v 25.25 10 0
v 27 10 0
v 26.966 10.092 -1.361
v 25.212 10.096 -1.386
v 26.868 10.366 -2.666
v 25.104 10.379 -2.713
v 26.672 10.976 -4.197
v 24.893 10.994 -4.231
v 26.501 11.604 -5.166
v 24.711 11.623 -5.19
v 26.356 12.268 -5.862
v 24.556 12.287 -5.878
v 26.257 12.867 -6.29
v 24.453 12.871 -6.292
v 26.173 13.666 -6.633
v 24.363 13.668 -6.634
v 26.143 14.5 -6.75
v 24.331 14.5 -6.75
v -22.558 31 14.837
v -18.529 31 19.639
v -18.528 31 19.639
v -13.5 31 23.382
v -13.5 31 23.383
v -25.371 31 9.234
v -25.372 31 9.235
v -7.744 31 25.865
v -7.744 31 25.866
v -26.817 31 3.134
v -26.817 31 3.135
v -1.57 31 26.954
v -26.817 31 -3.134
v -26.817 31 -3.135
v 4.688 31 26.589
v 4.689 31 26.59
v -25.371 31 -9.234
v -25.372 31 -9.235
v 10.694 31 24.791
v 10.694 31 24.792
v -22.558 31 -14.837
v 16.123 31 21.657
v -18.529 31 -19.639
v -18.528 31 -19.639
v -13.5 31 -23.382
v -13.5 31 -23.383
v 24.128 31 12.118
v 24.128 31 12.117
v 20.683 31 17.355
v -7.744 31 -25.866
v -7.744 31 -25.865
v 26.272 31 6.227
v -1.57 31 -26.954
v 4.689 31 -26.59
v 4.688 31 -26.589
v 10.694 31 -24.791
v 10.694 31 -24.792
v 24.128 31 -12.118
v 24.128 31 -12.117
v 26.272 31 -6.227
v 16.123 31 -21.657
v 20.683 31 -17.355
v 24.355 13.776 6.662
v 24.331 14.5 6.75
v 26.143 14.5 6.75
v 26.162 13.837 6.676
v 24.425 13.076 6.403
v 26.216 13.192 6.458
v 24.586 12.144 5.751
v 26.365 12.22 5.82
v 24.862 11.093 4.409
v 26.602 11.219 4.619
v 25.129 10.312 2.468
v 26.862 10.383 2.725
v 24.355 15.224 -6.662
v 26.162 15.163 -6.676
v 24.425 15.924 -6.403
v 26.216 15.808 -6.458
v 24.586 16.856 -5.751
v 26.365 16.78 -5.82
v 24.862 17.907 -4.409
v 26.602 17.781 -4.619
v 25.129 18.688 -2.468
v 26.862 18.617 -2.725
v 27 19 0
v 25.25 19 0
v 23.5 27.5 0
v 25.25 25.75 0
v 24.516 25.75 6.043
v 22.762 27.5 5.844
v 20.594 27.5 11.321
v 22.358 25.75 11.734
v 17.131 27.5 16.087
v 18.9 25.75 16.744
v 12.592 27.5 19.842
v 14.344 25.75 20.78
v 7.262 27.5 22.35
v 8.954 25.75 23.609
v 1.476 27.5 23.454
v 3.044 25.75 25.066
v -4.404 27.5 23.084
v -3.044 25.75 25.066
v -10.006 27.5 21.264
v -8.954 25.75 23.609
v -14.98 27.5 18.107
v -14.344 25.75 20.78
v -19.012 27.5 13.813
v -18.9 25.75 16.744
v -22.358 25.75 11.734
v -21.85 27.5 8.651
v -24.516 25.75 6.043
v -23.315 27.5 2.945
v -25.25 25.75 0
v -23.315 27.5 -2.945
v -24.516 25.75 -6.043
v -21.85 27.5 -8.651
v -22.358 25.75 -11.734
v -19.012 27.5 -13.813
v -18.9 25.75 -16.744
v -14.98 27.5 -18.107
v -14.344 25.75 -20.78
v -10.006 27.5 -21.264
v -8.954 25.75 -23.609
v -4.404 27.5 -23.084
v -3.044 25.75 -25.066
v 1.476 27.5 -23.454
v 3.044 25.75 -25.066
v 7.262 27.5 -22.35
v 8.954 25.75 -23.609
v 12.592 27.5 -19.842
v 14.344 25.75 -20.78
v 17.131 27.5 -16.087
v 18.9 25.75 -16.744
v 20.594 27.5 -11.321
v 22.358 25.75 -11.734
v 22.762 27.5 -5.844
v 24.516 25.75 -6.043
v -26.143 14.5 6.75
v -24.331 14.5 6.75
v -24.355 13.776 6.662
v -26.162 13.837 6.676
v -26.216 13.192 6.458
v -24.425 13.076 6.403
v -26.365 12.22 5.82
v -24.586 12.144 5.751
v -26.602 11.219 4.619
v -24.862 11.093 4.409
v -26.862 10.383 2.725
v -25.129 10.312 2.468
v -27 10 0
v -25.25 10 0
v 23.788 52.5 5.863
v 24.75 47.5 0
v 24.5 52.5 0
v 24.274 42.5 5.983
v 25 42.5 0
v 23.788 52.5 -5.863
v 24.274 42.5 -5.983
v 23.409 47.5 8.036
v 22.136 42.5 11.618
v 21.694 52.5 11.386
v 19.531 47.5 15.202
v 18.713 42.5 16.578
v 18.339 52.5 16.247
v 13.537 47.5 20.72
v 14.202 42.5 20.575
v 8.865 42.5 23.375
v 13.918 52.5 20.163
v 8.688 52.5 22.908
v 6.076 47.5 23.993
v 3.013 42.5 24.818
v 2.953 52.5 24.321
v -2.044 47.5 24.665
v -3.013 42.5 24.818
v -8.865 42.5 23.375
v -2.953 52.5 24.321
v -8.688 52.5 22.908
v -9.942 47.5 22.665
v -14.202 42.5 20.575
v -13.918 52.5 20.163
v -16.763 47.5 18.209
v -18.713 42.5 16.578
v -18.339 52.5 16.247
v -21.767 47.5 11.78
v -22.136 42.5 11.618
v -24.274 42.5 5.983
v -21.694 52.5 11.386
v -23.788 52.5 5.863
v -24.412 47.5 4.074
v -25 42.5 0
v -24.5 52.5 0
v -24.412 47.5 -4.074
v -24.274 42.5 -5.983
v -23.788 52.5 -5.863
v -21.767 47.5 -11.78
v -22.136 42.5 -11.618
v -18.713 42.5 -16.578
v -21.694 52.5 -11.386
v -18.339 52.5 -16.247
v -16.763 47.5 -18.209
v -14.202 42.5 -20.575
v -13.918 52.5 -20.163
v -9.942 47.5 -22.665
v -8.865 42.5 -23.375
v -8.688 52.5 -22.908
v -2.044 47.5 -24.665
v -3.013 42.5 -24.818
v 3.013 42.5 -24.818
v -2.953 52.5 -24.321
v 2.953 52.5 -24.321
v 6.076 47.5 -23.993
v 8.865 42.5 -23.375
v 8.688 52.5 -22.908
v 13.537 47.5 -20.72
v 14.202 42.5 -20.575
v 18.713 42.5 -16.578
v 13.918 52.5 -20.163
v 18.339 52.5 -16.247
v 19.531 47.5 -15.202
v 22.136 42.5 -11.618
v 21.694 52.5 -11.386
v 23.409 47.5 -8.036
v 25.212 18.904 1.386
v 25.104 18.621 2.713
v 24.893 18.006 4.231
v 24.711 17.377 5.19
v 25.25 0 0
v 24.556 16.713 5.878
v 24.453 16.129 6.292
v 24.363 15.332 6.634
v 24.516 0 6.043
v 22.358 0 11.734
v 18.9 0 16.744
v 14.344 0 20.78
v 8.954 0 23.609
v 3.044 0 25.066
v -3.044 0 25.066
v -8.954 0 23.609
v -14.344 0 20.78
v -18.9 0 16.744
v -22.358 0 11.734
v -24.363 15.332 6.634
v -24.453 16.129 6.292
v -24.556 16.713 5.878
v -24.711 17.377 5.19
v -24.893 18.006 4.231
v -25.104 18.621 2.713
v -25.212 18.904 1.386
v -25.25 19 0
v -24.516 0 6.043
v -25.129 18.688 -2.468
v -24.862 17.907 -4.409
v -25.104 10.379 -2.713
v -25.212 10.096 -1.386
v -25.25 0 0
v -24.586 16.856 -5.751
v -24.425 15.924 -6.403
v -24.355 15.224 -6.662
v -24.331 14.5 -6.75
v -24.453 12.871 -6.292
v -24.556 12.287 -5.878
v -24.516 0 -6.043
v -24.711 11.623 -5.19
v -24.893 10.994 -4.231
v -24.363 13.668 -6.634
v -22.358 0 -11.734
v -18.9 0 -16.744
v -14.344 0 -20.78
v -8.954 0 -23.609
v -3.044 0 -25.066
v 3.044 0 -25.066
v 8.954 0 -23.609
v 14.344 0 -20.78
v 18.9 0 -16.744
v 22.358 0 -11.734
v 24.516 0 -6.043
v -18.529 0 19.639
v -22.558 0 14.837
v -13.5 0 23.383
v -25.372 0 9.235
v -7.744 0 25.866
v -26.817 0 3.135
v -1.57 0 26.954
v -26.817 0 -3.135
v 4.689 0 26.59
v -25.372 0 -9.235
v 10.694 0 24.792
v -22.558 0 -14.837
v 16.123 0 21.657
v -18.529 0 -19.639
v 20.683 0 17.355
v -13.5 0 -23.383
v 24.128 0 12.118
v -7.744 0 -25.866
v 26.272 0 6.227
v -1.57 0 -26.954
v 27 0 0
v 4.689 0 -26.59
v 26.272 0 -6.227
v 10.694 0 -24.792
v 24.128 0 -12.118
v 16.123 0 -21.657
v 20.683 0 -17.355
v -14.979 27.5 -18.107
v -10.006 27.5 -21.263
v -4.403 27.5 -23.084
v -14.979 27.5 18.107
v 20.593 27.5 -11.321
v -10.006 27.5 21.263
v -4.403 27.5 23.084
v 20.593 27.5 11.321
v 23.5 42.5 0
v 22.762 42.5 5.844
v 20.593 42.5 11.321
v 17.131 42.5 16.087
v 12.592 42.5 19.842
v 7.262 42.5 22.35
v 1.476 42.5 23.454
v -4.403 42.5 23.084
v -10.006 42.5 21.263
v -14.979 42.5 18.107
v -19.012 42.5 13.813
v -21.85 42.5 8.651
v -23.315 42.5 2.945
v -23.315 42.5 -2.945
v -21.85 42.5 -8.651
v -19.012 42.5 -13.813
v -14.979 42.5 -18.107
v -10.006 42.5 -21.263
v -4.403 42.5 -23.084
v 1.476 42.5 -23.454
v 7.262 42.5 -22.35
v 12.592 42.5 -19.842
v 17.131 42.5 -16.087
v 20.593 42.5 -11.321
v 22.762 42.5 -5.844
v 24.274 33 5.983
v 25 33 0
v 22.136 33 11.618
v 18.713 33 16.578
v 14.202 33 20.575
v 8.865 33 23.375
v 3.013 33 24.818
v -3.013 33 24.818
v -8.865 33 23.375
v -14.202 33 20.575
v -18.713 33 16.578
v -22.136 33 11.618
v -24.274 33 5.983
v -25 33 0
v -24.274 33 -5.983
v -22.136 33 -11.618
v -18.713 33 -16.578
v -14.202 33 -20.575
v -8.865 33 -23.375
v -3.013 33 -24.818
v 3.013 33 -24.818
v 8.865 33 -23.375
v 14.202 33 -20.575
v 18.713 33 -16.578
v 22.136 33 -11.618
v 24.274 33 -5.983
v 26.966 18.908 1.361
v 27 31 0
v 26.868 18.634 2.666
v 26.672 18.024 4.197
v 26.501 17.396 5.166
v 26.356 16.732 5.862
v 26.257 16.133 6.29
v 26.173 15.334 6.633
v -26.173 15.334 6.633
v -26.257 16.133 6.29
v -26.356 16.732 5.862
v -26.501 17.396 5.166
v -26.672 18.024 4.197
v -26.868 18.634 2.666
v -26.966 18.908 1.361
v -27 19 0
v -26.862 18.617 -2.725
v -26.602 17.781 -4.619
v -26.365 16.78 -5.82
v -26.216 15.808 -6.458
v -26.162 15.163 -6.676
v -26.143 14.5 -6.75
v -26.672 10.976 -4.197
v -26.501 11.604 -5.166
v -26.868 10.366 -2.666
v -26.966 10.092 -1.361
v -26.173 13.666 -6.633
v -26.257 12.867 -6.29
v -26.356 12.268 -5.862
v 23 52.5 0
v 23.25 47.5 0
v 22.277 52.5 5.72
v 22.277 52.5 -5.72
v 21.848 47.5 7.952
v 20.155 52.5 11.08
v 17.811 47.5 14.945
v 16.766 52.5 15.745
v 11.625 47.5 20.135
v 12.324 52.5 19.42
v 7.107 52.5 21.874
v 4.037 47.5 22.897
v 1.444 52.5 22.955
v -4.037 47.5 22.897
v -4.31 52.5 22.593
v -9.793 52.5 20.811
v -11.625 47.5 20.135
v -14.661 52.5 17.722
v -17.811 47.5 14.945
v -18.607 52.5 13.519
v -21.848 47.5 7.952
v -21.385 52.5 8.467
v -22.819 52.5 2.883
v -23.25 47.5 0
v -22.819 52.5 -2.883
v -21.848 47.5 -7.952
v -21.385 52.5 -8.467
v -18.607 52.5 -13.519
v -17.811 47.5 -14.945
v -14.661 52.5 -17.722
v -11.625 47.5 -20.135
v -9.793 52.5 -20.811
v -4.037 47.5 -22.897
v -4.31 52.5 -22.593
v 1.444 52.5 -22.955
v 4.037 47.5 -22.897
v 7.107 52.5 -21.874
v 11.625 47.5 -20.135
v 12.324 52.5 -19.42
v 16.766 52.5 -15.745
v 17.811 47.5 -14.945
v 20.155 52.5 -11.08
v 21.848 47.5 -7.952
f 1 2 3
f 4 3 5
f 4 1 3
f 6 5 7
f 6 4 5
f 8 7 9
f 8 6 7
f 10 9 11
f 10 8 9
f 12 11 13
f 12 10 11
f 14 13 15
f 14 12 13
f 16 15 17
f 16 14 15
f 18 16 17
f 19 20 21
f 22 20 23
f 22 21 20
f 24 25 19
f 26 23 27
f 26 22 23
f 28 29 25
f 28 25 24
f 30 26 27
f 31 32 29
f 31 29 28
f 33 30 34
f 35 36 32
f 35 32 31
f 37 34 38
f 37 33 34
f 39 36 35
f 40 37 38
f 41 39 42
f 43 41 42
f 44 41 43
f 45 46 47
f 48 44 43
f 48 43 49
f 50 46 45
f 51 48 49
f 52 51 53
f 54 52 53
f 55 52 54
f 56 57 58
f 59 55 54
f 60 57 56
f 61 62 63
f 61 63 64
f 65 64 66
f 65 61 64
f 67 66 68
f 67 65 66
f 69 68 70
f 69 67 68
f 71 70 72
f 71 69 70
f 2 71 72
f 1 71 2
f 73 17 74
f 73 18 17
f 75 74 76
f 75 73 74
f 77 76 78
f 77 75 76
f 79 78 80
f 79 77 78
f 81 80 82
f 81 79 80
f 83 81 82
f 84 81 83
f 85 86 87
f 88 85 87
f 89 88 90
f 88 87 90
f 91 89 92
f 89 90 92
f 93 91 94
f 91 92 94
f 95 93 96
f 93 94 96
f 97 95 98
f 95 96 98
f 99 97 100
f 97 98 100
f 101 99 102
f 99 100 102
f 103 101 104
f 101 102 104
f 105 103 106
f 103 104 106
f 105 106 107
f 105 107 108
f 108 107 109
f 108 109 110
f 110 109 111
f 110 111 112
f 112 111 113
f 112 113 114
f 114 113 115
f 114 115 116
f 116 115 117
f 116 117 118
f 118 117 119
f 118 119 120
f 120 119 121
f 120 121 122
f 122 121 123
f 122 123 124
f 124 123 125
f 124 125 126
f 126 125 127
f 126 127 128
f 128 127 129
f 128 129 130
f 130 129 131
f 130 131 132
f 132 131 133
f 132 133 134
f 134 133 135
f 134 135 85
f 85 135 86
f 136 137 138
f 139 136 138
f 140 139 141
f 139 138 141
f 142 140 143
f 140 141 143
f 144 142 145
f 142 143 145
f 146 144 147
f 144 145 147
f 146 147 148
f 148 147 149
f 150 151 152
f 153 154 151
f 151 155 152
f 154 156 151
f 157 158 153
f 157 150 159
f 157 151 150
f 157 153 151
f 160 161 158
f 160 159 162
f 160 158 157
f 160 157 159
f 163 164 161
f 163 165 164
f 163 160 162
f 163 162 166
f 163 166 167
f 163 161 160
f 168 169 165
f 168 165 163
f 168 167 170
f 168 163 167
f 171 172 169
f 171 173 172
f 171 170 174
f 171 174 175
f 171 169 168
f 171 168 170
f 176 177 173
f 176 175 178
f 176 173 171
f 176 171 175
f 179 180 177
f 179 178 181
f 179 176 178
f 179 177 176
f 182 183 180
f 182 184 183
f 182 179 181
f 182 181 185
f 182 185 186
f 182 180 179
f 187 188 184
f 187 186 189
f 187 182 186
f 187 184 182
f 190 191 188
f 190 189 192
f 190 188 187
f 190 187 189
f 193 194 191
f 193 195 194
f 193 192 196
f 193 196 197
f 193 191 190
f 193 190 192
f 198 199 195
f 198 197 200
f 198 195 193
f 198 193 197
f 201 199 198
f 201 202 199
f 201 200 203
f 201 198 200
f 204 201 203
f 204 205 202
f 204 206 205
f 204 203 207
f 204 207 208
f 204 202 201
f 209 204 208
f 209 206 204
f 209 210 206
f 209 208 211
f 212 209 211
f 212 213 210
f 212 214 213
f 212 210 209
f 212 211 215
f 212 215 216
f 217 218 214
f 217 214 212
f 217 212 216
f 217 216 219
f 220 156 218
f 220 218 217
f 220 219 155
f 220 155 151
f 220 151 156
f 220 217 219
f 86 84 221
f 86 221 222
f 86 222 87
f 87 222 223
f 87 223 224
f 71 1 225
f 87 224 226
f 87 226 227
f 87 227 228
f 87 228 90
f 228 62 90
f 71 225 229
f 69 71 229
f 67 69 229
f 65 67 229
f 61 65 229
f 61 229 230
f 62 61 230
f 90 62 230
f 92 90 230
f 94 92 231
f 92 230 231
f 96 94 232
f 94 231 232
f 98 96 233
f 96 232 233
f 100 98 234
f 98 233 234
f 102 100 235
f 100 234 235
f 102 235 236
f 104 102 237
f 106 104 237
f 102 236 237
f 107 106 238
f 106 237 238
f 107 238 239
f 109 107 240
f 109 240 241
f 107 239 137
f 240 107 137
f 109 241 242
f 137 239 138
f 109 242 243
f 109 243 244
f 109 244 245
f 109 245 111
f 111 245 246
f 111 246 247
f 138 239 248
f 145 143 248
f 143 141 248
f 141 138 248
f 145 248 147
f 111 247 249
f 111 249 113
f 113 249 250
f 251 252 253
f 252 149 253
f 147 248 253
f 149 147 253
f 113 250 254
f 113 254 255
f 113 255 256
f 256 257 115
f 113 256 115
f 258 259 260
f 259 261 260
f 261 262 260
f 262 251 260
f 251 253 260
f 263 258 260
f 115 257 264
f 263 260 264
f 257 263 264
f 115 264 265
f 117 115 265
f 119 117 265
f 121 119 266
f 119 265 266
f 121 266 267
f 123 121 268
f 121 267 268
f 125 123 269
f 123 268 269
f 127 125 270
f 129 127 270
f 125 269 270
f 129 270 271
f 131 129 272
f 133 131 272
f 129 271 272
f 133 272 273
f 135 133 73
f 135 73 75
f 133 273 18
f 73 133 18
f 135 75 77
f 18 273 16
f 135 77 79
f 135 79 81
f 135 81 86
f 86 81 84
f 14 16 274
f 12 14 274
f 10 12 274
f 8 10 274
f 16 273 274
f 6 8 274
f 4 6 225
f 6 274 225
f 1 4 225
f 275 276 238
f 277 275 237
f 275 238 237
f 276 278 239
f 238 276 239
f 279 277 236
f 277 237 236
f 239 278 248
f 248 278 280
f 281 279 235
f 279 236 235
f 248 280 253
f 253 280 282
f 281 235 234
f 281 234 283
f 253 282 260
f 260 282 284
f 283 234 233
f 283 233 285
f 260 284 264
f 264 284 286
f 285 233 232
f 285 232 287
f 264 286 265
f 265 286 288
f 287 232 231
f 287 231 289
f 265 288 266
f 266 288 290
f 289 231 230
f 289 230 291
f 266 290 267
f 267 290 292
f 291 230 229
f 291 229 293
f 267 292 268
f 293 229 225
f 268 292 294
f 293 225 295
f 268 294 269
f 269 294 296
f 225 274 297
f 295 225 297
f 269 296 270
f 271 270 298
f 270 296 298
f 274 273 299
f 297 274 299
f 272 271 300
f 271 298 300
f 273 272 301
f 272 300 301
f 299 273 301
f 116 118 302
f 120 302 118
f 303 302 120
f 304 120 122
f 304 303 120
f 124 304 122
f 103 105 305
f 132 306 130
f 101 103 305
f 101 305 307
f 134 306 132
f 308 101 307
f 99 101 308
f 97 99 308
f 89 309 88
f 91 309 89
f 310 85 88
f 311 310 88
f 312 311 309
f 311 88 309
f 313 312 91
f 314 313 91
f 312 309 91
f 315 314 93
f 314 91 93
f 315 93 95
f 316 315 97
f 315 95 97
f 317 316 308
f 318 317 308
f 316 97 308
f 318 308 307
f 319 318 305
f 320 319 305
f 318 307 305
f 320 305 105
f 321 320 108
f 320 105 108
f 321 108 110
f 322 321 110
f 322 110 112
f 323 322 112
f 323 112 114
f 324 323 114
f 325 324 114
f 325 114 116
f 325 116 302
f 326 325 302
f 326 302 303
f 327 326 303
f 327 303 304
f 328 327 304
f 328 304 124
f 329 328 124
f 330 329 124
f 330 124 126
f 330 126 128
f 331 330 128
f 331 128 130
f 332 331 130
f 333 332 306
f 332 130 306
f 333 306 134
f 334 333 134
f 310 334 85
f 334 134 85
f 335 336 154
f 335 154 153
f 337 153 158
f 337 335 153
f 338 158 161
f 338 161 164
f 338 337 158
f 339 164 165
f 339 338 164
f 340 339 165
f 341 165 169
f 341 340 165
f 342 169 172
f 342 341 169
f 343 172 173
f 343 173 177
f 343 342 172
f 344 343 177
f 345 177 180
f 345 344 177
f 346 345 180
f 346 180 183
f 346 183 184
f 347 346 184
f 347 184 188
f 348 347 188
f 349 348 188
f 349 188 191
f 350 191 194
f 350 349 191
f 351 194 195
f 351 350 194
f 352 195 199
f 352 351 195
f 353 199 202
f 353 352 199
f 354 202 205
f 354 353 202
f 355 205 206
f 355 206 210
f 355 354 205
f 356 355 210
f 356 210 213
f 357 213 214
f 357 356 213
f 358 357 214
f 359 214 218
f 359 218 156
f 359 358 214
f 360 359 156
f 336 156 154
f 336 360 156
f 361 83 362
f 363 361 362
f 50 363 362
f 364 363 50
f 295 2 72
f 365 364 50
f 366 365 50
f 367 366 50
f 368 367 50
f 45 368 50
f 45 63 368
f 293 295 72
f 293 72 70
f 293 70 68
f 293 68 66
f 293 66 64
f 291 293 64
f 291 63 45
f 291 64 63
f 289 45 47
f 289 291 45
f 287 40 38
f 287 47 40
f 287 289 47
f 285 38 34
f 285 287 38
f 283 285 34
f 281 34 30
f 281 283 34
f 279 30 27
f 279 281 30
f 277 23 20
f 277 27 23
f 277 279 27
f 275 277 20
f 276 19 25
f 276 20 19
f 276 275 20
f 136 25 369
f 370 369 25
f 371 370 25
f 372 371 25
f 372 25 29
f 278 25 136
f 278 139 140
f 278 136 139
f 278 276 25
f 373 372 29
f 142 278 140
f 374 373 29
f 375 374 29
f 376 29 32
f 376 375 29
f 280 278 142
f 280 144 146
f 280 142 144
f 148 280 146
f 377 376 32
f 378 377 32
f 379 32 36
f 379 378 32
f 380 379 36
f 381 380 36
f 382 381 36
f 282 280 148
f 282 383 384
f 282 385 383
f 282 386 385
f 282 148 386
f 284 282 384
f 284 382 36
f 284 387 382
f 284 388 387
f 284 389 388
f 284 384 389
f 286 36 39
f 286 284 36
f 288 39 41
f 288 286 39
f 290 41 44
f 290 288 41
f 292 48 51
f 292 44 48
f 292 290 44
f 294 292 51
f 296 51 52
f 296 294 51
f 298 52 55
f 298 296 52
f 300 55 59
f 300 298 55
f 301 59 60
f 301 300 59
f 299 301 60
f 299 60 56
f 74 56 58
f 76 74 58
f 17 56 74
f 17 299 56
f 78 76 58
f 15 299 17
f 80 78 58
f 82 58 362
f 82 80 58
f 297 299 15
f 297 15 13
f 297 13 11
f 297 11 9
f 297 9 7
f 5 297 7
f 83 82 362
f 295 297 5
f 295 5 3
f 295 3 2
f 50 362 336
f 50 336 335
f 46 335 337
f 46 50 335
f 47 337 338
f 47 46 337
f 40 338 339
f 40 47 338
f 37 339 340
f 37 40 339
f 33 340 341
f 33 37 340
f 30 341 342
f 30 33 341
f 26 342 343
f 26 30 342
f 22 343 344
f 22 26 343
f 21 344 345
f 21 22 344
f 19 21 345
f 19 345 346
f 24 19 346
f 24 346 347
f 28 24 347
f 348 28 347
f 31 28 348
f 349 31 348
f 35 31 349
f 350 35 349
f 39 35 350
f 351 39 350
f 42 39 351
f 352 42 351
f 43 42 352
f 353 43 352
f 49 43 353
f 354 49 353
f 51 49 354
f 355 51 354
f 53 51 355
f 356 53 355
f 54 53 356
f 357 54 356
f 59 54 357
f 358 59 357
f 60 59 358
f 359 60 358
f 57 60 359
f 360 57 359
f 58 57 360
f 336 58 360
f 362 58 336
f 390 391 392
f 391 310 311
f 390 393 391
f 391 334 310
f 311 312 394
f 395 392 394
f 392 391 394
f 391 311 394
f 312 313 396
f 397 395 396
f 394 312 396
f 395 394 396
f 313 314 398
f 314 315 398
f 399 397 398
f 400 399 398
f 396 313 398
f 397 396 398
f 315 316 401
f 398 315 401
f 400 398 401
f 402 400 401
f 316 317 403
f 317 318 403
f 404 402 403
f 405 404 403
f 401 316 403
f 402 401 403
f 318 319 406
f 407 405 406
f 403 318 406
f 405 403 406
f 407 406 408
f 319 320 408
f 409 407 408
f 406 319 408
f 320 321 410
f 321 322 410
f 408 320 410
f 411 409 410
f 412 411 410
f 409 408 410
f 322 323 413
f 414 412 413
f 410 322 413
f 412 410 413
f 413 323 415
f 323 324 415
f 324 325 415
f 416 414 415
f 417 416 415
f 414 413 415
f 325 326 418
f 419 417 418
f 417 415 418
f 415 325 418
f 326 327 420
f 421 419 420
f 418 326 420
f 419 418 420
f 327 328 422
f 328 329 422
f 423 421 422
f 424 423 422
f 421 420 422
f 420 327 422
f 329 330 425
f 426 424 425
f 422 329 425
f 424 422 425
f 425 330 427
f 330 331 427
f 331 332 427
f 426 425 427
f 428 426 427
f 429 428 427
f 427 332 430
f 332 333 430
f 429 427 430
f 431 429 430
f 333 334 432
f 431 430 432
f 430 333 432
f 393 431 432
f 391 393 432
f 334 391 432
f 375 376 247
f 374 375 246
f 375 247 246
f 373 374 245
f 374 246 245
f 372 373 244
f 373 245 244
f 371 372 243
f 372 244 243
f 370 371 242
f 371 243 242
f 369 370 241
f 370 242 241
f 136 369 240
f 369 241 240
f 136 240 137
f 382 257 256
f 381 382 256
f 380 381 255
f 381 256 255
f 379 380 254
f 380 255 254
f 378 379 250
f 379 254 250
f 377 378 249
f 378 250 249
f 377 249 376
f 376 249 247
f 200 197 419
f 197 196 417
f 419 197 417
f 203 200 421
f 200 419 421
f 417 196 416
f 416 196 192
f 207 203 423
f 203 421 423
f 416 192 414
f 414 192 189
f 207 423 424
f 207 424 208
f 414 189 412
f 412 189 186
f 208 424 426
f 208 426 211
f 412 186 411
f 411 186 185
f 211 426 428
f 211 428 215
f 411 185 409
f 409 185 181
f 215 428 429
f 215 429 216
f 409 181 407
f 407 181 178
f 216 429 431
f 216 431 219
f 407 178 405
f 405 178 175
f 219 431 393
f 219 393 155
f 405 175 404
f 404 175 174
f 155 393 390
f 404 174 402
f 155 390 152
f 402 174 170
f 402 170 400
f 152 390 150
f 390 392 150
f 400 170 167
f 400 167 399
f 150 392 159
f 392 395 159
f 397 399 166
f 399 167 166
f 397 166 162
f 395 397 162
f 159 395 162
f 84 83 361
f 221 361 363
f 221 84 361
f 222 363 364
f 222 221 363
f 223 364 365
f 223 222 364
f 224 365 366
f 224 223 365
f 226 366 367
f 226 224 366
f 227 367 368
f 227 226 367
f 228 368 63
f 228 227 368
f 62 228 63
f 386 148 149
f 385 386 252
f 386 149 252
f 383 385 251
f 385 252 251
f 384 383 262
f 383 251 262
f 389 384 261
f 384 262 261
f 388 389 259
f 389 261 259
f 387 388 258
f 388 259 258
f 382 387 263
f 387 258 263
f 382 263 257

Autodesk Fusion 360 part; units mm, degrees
sketch "Sketch2" plane through (0, 0, 0) normal (0, 1, 0) x (1, 0, 0)
  circle A0 centre (0, 0) radius 24
  circle A1 centre (0, 0) radius 25.25
  circle A2 centre (0, 0) radius 27
  dimension "d6" = 48
  dimension "d29" = 50.5
  dimension "d37" = 54
extrude "Extrude1" add sketch "Sketch2" along normal blind 31 contours A2
sketch "Sketch3" plane through (0, 0, 0) normal (1, 0, 0) x (0, 0, -1)
  ellipse E0 centre (0, 14.5) end of major axis (-6.75, 14.5) minor radius 4.5
  line L0 (6.75, 14.5) -> (-6.75, 14.5)
  line L1 (0, 19) -> (0, 10)
  dimension "d18" = 13.5
  dimension "d20" = 14.5
  dimension "d49" = 4.5
extrude "Extrude8" cut sketch "Sketch3" along normal mid plane 60
ref_plane "WorkPlane3" through (0, 27.5, 0) normal (0, -1, 0) x (-1, 0, 0)
ref_plane "WorkPlane4" through (0, 52.5, 0) normal (0, -1, 0) x (-1, 0, 0)
sketch "Sketch7" plane through (0, 52.5, 0) normal (0, -1, 0) x (1, 0, 0)
  circle A0 centre (0, 0) radius 23
  circle A1 centre (0, 0) radius 24.5
  dimension "d63" = 46
  dimension "d64" = 49
sketch "Sketch8" plane through (0, 27.5, 0) normal (0, -1, 0) x (1, 0, 0)
  circle A0 centre (0, 0) radius 25
  circle A1 centre (0, 0) radius 23.5
  circle A2 centre (0, 0) radius 27
  dimension "d67" = 50
  dimension "d68" = 47
  dimension "d76" = 54
ref_plane "WorkPlane5" through (0, 42.5, 0) normal (0, -1, 0) x (1, 0, 0)
sketch "Sketch10" plane through (0, 42.5, 0) normal (0, -1, 0) x (1, 0, 0)
  circle A0 centre (0, 0) radius 23.5
  circle A1 centre (0, 0) radius 25
  dimension "d70" = 47
  dimension "d71" = 50
extrude "Extrude14" add sketch "Sketch8" against normal blind 3.5 contours A0 | A2
extrude "Extrude13" add sketch "Sketch8" against normal blind 15 contours A0
loft "Loft1" add profiles "Sketch10", "Sketch7" section 1 section 2
loft "Loft2" cut profiles "Sketch7", "Sketch10" section 1 contours A0 section 2 contours A0
chamfer "Chamfer5" distance 2 angle 45 1 edges at (-23.3082, 31, -9.0404)
chamfer "Chamfer6" distance 1.75 angle 45 1 edges at (-23.5413, 27.5, 9.1308)
